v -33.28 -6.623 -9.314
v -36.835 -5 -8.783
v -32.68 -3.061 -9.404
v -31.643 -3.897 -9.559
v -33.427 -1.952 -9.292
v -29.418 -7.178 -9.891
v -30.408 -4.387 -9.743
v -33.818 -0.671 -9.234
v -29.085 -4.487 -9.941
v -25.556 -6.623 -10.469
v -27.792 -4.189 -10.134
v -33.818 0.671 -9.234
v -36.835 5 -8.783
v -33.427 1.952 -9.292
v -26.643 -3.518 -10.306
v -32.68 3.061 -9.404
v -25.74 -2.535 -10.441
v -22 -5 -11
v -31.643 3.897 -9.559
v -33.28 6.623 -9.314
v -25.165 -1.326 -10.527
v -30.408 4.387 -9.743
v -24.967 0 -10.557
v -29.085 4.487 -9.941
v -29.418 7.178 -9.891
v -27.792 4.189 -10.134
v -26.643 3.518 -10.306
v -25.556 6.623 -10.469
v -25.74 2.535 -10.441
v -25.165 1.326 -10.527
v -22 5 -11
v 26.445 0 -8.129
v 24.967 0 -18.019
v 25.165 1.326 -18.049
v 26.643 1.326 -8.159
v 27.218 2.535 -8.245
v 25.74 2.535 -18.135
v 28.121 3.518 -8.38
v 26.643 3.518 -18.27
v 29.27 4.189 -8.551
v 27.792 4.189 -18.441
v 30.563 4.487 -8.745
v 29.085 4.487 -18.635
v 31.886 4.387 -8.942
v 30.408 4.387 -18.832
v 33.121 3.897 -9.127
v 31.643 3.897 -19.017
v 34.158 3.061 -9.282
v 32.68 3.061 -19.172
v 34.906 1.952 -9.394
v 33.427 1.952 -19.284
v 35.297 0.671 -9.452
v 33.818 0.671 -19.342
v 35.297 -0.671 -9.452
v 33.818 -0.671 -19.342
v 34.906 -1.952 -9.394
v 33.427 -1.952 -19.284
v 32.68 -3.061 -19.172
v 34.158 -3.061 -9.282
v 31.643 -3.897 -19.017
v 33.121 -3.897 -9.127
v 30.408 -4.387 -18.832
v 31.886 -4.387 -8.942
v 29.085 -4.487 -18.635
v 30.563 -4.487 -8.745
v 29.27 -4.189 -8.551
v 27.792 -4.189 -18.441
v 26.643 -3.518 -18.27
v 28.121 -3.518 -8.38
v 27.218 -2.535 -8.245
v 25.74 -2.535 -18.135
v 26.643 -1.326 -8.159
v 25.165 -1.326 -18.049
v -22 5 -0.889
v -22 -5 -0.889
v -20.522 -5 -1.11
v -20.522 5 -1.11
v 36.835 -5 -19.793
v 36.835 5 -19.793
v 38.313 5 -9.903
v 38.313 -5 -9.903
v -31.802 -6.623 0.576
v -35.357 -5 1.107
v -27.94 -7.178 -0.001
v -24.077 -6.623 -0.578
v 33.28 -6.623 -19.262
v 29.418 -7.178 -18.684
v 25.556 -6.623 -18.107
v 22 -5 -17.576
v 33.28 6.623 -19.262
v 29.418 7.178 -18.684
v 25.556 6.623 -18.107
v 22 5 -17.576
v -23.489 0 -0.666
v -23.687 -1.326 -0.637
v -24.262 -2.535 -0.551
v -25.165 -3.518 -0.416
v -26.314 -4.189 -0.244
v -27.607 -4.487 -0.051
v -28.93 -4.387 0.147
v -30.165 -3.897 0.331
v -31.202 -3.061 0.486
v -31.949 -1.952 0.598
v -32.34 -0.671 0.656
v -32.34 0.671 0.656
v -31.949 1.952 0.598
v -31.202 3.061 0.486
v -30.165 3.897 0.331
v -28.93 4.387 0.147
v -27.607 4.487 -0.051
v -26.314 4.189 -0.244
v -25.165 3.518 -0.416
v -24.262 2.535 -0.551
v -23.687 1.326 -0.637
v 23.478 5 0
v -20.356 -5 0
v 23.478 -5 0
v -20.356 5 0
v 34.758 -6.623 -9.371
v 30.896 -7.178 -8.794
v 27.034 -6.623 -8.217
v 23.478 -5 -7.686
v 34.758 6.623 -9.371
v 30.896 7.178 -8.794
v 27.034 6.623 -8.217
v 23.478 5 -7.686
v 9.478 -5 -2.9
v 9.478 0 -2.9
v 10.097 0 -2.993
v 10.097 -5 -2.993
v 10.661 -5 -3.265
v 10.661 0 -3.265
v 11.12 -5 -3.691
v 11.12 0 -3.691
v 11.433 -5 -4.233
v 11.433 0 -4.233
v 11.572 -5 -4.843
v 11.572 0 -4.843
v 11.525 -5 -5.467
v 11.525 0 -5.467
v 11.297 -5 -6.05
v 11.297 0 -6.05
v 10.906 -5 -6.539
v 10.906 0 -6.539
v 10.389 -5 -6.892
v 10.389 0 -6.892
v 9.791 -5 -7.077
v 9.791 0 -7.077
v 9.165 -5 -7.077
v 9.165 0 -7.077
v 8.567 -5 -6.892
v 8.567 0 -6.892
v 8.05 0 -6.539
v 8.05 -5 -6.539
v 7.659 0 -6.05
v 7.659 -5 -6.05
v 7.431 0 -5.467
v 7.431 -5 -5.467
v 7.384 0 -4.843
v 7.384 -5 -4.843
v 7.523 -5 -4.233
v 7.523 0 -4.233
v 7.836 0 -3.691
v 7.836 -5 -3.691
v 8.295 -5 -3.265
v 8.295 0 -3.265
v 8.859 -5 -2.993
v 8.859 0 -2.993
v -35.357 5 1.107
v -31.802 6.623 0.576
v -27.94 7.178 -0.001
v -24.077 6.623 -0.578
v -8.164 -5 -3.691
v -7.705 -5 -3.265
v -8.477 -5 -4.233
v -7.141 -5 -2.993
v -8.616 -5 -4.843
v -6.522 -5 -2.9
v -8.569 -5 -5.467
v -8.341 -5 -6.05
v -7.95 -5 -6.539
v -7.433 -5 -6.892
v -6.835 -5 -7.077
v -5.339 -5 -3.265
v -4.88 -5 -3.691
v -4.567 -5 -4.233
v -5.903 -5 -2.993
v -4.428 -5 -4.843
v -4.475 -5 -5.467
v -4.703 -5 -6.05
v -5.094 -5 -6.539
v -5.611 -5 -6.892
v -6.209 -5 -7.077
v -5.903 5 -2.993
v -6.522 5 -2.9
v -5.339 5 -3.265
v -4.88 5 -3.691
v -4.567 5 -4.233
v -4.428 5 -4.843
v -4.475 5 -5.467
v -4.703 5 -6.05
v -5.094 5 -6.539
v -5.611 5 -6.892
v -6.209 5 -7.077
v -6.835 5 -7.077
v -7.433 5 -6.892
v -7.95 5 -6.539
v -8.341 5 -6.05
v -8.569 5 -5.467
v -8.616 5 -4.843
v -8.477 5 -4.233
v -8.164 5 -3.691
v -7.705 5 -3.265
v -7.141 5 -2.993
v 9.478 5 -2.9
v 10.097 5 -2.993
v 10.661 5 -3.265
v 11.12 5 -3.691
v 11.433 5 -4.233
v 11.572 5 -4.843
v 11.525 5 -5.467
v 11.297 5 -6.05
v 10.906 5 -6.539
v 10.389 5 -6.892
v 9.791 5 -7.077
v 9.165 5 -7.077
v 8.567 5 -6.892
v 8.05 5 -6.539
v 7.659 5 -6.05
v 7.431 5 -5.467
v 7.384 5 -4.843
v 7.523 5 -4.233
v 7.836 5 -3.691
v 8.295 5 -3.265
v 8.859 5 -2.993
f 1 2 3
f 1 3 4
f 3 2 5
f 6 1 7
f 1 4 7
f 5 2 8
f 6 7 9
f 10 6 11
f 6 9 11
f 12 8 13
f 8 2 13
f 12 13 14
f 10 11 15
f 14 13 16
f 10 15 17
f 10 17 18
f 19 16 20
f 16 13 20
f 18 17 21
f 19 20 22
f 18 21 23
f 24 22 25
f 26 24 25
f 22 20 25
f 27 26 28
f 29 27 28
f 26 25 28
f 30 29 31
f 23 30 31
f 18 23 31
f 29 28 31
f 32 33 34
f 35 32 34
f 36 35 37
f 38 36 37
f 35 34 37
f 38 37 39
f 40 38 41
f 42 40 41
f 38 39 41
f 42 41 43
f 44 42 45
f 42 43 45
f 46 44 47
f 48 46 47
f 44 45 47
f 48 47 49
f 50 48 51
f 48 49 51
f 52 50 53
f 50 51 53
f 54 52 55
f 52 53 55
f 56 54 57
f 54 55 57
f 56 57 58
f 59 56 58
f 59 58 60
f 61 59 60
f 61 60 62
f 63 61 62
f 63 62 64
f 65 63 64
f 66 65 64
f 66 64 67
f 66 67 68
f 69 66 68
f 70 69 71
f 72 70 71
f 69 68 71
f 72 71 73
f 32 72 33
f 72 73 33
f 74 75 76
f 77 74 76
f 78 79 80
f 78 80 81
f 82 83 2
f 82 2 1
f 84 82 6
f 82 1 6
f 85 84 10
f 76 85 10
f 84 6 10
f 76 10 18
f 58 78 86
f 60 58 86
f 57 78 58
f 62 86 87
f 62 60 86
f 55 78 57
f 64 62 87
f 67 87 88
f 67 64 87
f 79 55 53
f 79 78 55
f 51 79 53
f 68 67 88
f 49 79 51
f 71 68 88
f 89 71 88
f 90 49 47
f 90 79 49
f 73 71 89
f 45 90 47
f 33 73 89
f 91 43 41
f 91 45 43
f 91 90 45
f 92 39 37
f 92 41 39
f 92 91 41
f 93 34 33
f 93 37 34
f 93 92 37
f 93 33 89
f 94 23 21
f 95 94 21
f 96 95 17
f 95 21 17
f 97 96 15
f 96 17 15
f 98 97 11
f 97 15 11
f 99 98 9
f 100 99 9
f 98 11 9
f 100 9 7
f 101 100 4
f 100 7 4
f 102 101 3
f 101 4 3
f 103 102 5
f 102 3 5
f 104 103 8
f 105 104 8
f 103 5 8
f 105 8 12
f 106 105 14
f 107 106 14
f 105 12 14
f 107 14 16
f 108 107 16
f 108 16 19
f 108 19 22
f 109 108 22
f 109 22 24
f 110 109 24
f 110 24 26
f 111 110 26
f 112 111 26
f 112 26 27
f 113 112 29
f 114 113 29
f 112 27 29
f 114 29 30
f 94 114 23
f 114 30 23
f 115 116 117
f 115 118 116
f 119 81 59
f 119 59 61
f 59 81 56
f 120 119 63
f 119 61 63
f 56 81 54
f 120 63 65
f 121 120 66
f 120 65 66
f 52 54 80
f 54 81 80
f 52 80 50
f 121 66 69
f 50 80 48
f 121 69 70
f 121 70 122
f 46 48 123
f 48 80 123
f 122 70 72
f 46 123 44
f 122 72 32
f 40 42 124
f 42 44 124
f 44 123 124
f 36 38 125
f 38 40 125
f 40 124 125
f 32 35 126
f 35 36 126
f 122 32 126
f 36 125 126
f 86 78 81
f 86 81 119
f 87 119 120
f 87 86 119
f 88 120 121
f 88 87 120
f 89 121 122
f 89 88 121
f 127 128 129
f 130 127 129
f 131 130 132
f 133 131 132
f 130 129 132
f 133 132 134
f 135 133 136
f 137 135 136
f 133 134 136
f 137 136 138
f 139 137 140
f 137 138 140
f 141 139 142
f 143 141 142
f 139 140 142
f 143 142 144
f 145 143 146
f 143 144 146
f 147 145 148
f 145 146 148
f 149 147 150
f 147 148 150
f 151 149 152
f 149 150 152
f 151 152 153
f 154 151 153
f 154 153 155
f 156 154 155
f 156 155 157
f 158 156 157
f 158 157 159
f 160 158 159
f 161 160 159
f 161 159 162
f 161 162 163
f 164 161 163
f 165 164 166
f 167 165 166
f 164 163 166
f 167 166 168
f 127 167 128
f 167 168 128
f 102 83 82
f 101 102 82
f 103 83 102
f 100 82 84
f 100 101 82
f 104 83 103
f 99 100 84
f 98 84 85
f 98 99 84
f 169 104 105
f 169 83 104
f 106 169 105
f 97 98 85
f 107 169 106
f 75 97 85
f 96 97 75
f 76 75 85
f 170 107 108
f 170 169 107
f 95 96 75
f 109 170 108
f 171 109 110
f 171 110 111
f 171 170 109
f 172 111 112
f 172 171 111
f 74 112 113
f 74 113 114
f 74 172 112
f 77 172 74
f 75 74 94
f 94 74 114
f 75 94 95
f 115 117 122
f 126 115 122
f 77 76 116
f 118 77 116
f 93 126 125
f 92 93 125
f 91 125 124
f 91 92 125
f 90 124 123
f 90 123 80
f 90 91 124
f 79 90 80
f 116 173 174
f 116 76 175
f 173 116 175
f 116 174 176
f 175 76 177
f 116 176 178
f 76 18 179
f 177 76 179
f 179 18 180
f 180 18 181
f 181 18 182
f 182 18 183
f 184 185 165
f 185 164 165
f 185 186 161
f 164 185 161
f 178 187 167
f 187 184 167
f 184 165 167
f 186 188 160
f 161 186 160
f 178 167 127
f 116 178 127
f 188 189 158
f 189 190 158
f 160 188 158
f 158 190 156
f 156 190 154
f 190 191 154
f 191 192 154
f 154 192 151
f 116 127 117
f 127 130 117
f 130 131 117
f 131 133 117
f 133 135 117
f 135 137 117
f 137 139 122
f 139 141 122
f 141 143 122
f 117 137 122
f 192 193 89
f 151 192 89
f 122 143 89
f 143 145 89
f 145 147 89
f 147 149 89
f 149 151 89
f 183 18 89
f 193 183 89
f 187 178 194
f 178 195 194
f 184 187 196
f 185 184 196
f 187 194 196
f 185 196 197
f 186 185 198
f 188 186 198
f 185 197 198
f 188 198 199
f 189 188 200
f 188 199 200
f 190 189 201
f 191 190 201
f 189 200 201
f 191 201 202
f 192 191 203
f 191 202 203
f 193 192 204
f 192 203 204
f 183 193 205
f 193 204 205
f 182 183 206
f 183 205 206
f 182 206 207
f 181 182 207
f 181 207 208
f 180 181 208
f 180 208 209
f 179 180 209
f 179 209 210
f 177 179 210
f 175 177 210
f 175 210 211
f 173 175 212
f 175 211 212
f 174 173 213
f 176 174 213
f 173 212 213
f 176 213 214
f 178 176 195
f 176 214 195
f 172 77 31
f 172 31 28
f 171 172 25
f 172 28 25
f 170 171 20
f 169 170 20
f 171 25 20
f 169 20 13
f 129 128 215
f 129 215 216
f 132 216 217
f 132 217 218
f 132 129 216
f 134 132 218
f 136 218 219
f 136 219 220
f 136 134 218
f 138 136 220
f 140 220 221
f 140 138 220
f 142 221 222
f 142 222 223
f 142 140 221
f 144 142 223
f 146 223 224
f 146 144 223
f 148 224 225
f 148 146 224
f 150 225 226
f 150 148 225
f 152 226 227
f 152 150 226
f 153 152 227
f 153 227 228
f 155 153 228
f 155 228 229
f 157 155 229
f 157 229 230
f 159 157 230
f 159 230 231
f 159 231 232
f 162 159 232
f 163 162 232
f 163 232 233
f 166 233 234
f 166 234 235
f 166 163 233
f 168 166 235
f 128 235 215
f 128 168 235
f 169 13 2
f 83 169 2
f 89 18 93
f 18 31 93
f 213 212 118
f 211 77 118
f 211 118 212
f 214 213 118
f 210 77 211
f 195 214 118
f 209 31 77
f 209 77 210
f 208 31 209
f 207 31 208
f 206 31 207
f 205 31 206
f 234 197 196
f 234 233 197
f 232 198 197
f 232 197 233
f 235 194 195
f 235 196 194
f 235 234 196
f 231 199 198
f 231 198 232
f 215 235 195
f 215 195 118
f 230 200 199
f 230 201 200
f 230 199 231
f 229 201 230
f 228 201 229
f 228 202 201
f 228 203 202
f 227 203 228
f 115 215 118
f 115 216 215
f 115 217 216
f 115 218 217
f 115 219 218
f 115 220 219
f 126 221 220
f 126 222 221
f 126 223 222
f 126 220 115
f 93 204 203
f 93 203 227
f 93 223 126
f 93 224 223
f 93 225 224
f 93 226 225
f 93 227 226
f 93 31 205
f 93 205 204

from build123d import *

# Parameters (mm, degrees)
EXTRUDE_2_DEPTH     = 5
SKETCH_4_R          = 4.5
EXTRUDE_3_DEPTH     = 10
EXTRUDE_4_DEPTH     = 5
CUT_EXTRUDE_1_DEPTH = 5
EXTRUDE_5_DEPTH     = 5
CUT_EXTRUDE_2_DEPTH = 5
SKETCH_9_R          = 2.1
CUT_EXTRUDE_3_DEPTH = 5


with BuildPart() as part:
    # 草图3 → 凸台-拉伸2 (new, symmetric)
    with BuildSketch(Plane(origin=(0, 0, 0), x_dir=(1, 0, 0), z_dir=(0, 1, 0))):
        Polygon((-22, 0), (-22, 11), (22, 17.575844059), (22, 0), align=None)
    extrude(amount=EXTRUDE_2_DEPTH, both=True)

    # 草图4 → 凸台-拉伸3 (add)
    # profile 1 of 2: a face of its own
    with BuildSketch(Plane(origin=(-2.08869206, 0, -13.97576491), x_dir=(-0.9890158633619178, 0, 0.1478094111296043), z_dir=(-0.1478094111296043, 0, -0.9890158633619178))):
        with BuildLine():
            Line((-24.356224154, -5), (-24.356224154, 5))
            ThreePointArc((-24.356224154, 5), (-31.856224154, 7.178409582), (-39.356224154, 5))
            Line((-39.356224154, 5), (-39.356224154, -5))
            ThreePointArc((-39.356224154, -5), (-31.856224154, -7.178409582), (-24.356224154, -5))
        make_face()
        with Locations((-31.856224154, 0)):
            Circle(SKETCH_4_R, mode=Mode.SUBTRACT)
    # profile 2 of 2: a face of its own
    with BuildSketch(Plane(origin=(-2.08869206, 0, -13.97576491), x_dir=(-0.9890158633619178, 0, 0.1478094111296043), z_dir=(-0.1478094111296043, 0, -0.9890158633619178))):
        with BuildLine():
            Line((35.132445472, 5), (35.132445472, -5))
            ThreePointArc((35.132445472, -5), (27.632445472, -7.178409582), (20.132445472, -5))
            Line((20.132445472, -5), (20.132445472, 5))
            ThreePointArc((20.132445472, 5), (27.632445472, 7.178409582), (35.132445472, 5))
        make_face()
        with Locations(Location((27.632445472, 0, 0), (0, 0, 180))):
            Circle(SKETCH_4_R, mode=Mode.SUBTRACT)
    extrude(amount=-EXTRUDE_3_DEPTH)


with BuildPart() as extrude_3_piece_1:
    # of the separate pieces the step leaves, piece 1, a body of its own (extrude_3_pieces)
    add(part.part.solids().sort_by_distance((-22, -5, 0))[0])



with BuildPart() as extrude_3_piece_2:
    # of the separate pieces the step leaves, piece 2, a body of its own (extrude_3_pieces)
    add(part.part.solids().sort_by_distance((23.478094111, -5, -7.685685426))[0])


with BuildPart() as extrude_3_piece_1_1:
    add(extrude_3_piece_1.part)

    add(extrude_3_piece_2.part)  # 凸台-拉伸4 merges 凸台-拉伸3 piece 2
    # 草图5 → 凸台-拉伸4 (add, symmetric)
    with BuildSketch(Plane(origin=(0, 0, 0), x_dir=(1, 0, 0), z_dir=(0, 1, 0))):
        Polygon((23.478094111, 7.685685426), (22, 7.464782781), (22, 17.575844059), align=None)
    extrude(amount=EXTRUDE_4_DEPTH, both=True)

    # 草图6 → 切除-拉伸1 (cut, symmetric)
    with BuildSketch(Plane(origin=(0, 0, 0), x_dir=(1, 0, 0), z_dir=(0, 1, 0))):
        Polygon((-22, 0), (-22, 0.888938721), (-20.521905889, 1.109841366), (-20.356038985, 0), align=None)
    extrude(amount=CUT_EXTRUDE_1_DEPTH, both=True, mode=Mode.SUBTRACT)

    # 草图7 → 凸台-拉伸5 (add, symmetric)
    with BuildSketch(Plane(origin=(0, 0, 0), x_dir=(1, 0, 0), z_dir=(0, 1, 0))):
        Polygon((22, 0), (24.626727494, 0), (23.478094111, 7.685685426), (22, 7.464782781), align=None)
    extrude(amount=EXTRUDE_5_DEPTH, both=True)

    # 草图8 → 切除-拉伸2 (cut, symmetric)
    with BuildSketch(Plane(origin=(0, 0, 0), x_dir=(1, 0, 0), z_dir=(0, 1, 0))):
        Polygon((23.478094111, 0), (23.478094111, 7.685685426), (24.626727494, 0), align=None)
    extrude(amount=CUT_EXTRUDE_2_DEPTH, both=True, mode=Mode.SUBTRACT)

    # 草图9 → 切除-拉伸3 (cut, symmetric)
    with BuildSketch(Plane(origin=(0, 0, 0), x_dir=(1, 0, 0), z_dir=(0, 1, 0))):
        with Locations(Location((9.478094111, 5, 0), (0, 0, 270))):
            Circle(SKETCH_9_R)
        with Locations(Location((-6.521905889, 5, 0), (0, 0, 270))):
            Circle(SKETCH_9_R)
    extrude(amount=CUT_EXTRUDE_3_DEPTH, both=True, mode=Mode.SUBTRACT)


solid = extrude_3_piece_1_1.part
